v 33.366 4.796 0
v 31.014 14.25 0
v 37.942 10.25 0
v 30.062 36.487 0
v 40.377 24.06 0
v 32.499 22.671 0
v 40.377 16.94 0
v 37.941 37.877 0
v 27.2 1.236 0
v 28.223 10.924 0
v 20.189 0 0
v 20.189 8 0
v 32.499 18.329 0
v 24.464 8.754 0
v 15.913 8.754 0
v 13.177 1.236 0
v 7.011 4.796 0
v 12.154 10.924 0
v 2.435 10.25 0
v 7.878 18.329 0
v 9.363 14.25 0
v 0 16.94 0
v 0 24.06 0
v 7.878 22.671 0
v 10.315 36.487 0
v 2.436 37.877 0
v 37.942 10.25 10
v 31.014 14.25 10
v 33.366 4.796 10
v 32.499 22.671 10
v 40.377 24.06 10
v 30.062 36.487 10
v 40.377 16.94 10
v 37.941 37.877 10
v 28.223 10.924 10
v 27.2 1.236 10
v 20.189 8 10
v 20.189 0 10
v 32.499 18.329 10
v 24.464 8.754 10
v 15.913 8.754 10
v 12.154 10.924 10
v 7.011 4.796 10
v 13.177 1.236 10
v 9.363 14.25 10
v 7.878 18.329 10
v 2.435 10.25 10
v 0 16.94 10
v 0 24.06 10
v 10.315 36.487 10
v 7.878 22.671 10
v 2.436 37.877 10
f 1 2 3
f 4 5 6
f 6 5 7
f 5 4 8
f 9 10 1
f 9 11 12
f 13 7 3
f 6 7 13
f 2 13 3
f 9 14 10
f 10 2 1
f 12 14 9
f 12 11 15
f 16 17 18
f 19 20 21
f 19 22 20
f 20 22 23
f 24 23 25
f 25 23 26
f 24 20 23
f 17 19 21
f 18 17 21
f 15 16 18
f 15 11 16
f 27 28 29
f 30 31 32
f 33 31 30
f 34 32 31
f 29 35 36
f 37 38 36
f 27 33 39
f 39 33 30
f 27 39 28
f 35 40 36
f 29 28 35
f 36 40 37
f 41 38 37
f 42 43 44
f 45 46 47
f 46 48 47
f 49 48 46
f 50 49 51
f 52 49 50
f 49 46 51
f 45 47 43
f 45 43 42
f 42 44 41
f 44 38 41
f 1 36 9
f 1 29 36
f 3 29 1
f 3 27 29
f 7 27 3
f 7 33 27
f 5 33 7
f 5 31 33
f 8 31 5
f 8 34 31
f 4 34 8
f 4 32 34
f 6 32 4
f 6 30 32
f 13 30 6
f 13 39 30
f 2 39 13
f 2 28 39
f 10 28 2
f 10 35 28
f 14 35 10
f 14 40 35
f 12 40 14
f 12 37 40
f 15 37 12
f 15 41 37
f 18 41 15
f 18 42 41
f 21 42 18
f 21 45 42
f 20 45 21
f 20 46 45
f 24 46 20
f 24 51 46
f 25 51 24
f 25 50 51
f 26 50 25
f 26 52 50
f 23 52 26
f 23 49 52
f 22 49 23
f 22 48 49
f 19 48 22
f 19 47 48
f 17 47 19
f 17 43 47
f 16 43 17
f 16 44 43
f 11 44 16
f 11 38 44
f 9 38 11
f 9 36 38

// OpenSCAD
$fn = 32;

// ----------------------------------------------------------------------
// Clip blank: omega clip, 10 mm thick
// ----------------------------------------------------------------------

// --- parameters (mm) ---
profile_height = 10;      // extrusion height
profile_points = 26;      // points of the closed outline

profile = [[0, 24.06], [0, 16.94], [2.435, 10.25], [7.011, 4.796], [13.177, 1.236], [20.189, 0], [27.2, 1.236], [33.366, 4.796], [37.942, 10.25], [40.377, 16.94], [40.377, 24.06], [37.941, 37.877], [30.062, 36.487], [32.499, 22.671], [32.499, 18.329], [31.014, 14.25], [28.223, 10.924], [24.464, 8.754], [20.189, 8], [15.913, 8.754], [12.154, 10.924], [9.363, 14.25], [7.878, 18.329], [7.878, 22.671], [10.315, 36.487], [2.436, 37.877]];  // single closed polygon, 26 points, counter clockwise

// --- the one profile operation ---
linear_extrude(height = profile_height) polygon(points = profile);
